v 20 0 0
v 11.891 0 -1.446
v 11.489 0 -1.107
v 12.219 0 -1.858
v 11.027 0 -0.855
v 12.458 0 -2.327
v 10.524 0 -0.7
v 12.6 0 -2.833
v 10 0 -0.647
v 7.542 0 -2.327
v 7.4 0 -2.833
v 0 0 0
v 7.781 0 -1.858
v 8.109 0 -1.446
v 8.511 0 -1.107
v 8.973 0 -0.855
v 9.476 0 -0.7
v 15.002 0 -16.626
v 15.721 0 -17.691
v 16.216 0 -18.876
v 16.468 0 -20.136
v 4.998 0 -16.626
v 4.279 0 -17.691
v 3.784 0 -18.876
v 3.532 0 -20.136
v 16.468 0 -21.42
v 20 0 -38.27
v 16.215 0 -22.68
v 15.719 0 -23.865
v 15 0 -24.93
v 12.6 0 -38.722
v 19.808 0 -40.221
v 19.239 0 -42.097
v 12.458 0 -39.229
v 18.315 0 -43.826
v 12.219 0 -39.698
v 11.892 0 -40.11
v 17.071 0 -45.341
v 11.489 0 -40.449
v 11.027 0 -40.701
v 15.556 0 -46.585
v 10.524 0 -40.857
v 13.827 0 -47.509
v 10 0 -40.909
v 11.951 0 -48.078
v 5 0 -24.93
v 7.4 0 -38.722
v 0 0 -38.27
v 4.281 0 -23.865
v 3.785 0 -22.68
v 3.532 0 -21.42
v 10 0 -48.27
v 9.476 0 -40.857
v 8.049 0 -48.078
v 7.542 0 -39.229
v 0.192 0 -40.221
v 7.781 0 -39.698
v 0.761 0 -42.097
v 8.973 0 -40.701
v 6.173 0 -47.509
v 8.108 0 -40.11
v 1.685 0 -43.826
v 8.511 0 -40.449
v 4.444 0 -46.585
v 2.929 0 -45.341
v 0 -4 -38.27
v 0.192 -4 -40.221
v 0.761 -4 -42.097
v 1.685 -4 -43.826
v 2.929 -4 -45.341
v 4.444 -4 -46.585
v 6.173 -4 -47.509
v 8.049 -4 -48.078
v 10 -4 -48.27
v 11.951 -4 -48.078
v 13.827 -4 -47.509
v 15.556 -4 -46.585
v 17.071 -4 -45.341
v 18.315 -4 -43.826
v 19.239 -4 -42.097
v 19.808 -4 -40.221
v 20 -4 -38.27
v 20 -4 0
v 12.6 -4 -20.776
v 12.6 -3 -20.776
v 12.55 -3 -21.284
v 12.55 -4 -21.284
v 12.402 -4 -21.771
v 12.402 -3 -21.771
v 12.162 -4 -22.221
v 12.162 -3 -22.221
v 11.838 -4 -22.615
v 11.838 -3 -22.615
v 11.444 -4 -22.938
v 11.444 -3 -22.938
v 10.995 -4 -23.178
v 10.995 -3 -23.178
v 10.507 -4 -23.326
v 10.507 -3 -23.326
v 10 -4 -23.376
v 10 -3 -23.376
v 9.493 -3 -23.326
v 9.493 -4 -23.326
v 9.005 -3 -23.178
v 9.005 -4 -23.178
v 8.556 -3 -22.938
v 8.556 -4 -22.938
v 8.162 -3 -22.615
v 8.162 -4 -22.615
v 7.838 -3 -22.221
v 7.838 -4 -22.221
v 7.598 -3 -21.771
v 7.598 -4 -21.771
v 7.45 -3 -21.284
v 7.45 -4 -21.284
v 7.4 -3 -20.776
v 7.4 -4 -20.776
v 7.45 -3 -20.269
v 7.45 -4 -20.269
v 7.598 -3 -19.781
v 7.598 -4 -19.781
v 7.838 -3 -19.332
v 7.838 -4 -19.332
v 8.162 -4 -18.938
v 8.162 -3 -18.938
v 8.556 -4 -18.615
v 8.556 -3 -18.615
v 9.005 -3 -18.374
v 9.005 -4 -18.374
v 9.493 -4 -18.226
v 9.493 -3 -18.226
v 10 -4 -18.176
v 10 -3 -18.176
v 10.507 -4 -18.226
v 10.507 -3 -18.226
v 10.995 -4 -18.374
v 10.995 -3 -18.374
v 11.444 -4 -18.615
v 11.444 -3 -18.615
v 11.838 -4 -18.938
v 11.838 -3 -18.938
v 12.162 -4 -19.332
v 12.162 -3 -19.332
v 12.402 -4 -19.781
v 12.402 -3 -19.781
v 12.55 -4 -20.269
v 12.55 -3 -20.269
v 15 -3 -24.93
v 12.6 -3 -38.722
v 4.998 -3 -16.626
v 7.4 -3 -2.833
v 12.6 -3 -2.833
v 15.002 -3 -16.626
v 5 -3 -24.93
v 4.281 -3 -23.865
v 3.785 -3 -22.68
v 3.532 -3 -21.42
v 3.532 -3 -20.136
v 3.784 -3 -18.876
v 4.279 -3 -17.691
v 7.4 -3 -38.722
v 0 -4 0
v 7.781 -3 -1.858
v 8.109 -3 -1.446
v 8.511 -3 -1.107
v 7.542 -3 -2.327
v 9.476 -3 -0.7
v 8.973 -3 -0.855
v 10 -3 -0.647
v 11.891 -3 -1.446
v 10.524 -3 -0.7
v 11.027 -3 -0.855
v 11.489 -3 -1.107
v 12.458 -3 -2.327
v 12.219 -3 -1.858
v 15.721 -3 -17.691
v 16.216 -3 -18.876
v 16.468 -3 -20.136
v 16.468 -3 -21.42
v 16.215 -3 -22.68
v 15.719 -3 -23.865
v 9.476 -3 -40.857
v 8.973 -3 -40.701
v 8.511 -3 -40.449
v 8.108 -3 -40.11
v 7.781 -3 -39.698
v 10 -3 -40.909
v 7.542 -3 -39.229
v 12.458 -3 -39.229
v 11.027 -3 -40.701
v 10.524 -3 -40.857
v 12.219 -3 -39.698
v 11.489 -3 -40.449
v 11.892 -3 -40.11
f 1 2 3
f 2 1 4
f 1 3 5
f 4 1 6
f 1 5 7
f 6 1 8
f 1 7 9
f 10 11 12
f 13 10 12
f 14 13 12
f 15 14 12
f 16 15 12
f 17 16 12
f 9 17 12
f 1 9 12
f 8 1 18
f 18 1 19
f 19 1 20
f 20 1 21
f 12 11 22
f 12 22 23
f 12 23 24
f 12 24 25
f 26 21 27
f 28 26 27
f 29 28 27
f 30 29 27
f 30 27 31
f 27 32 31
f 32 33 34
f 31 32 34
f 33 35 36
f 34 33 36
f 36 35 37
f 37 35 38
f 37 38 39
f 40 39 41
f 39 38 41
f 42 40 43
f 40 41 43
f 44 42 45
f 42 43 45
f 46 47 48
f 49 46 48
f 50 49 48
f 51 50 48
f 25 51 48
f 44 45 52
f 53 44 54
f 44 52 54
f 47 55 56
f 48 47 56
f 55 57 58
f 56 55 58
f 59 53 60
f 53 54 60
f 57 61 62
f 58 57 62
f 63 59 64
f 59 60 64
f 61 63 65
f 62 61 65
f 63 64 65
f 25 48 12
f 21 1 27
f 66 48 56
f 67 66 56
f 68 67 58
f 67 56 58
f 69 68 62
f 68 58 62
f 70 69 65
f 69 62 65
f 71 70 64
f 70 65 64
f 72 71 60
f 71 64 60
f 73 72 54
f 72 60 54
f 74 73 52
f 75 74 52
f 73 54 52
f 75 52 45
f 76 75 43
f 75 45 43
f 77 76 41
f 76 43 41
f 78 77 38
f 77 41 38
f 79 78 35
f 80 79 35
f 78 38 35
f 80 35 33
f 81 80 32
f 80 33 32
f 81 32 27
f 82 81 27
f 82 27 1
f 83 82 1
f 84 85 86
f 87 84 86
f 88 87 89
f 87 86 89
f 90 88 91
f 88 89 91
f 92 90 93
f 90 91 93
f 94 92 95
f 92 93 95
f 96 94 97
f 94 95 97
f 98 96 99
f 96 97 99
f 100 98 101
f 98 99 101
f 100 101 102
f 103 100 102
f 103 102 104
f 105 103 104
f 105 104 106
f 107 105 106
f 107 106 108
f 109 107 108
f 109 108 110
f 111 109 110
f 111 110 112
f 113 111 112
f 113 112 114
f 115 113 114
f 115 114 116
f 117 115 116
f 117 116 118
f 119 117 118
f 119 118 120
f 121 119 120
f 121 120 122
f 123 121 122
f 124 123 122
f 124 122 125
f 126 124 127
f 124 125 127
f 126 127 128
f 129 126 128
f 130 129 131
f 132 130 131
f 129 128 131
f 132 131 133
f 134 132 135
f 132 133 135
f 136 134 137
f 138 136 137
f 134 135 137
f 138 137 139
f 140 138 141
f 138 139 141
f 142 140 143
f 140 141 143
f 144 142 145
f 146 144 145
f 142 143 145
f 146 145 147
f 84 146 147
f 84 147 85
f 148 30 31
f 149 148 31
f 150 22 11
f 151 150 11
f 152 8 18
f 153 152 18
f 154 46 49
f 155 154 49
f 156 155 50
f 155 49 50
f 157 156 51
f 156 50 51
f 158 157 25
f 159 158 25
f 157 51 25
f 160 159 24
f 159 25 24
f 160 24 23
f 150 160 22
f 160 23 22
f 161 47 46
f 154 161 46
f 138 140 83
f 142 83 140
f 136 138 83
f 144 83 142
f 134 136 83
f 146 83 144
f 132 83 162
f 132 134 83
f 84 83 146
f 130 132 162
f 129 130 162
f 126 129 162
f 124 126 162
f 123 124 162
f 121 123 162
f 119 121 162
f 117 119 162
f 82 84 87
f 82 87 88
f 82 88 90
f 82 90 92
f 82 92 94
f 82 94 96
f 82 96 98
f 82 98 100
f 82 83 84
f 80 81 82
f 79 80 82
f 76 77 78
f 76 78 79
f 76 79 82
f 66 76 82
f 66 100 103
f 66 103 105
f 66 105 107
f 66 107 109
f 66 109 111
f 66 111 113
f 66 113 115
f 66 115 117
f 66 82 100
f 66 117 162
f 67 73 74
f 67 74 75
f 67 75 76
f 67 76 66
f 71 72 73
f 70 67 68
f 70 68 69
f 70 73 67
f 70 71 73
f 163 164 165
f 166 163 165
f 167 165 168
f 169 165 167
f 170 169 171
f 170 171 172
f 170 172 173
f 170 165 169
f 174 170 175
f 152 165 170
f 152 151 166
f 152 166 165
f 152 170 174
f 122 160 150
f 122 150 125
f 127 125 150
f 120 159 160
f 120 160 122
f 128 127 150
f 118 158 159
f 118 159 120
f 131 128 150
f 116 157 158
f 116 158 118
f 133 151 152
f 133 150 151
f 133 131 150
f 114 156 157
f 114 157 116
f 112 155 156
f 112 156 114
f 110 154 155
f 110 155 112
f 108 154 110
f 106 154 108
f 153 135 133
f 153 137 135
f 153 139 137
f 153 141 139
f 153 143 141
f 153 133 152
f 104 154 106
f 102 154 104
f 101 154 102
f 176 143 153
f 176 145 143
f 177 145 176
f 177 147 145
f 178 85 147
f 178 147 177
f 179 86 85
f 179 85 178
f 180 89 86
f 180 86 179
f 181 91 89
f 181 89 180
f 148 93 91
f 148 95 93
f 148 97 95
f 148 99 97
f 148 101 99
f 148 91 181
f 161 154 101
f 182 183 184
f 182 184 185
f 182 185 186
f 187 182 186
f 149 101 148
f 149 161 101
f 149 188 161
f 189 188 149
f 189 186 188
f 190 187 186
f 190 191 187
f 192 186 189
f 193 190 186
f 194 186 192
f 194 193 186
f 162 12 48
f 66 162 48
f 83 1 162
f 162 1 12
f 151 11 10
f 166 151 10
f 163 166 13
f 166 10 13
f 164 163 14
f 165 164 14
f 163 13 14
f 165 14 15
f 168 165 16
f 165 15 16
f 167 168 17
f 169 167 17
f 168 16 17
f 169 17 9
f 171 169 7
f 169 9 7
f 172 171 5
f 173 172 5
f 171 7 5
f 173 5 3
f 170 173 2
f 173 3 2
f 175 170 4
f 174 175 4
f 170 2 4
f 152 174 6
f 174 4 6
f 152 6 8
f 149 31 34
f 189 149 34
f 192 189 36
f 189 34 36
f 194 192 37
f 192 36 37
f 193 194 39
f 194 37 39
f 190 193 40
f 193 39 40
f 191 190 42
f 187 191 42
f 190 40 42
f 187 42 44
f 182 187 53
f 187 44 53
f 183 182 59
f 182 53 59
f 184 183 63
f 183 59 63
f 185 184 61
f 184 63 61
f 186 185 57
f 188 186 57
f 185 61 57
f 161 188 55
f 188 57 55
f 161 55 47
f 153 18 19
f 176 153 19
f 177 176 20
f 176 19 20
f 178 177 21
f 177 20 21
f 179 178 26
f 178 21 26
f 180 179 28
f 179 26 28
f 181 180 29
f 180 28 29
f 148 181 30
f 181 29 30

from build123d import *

# Parameters (mm, degrees)
EXTRUDE_6_DEPTH      = 4
CUT_EXTRUDE_12_DEPTH = 3
SKETCH_3_R           = 2.6
CUT_EXTRUDE_13_DEPTH = 4


with BuildPart() as part:
    # 草圖1 → 填料-伸長6 (new body)
    with BuildSketch(Plane(origin=(0, 0, 0), x_dir=(1, 0, 0), z_dir=(0, 1, 0))):
        with BuildLine():
            Line((0, 0), (0, 38.27))
            ThreePointArc((0, 38.27), (10, 48.27), (20, 38.27))
            Line((20, 38.27), (20, 0))
            Line((20, 0), (0, 0))
        make_face()
    extrude(amount=-EXTRUDE_6_DEPTH)

    # 草圖2 → 除料-伸長12 (cut)
    with BuildSketch(Plane(origin=(0, 0, 0), x_dir=(1, 0, 0), z_dir=(0, 1, 0))):
        with BuildLine():
            Line((7.4, 38.722411537), (5, 24.929659817))
            ThreePointArc((5, 24.929659817), (3.500000254, 20.778165453), (4.997678036, 16.625832861))
            Line((4.997678036, 16.625832861), (7.4, 2.833485375))
            ThreePointArc((7.4, 2.833485375), (10, 0.647203241), (12.6, 2.833485375))
            Line((12.6, 2.833485375), (15.002321964, 16.625832861))
            ThreePointArc((15.002321964, 16.625832861), (16.499999746, 20.778165453), (15, 24.929659817))
            Line((15, 24.929659817), (12.6, 38.722411537))
            ThreePointArc((12.6, 38.722411537), (10, 40.909067297), (7.4, 38.722411537))
        make_face()
    extrude(amount=-CUT_EXTRUDE_12_DEPTH, mode=Mode.SUBTRACT)

    # 草圖3 → 除料-伸長13 (cut)
    with BuildSketch(Plane(origin=(0, 0, 0), x_dir=(1, 0, 0), z_dir=(0, 1, 0))):
        with Locations((10, 20.776347886)):
            Circle(SKETCH_3_R)
    extrude(amount=-CUT_EXTRUDE_13_DEPTH, mode=Mode.SUBTRACT)


solid = part.part
